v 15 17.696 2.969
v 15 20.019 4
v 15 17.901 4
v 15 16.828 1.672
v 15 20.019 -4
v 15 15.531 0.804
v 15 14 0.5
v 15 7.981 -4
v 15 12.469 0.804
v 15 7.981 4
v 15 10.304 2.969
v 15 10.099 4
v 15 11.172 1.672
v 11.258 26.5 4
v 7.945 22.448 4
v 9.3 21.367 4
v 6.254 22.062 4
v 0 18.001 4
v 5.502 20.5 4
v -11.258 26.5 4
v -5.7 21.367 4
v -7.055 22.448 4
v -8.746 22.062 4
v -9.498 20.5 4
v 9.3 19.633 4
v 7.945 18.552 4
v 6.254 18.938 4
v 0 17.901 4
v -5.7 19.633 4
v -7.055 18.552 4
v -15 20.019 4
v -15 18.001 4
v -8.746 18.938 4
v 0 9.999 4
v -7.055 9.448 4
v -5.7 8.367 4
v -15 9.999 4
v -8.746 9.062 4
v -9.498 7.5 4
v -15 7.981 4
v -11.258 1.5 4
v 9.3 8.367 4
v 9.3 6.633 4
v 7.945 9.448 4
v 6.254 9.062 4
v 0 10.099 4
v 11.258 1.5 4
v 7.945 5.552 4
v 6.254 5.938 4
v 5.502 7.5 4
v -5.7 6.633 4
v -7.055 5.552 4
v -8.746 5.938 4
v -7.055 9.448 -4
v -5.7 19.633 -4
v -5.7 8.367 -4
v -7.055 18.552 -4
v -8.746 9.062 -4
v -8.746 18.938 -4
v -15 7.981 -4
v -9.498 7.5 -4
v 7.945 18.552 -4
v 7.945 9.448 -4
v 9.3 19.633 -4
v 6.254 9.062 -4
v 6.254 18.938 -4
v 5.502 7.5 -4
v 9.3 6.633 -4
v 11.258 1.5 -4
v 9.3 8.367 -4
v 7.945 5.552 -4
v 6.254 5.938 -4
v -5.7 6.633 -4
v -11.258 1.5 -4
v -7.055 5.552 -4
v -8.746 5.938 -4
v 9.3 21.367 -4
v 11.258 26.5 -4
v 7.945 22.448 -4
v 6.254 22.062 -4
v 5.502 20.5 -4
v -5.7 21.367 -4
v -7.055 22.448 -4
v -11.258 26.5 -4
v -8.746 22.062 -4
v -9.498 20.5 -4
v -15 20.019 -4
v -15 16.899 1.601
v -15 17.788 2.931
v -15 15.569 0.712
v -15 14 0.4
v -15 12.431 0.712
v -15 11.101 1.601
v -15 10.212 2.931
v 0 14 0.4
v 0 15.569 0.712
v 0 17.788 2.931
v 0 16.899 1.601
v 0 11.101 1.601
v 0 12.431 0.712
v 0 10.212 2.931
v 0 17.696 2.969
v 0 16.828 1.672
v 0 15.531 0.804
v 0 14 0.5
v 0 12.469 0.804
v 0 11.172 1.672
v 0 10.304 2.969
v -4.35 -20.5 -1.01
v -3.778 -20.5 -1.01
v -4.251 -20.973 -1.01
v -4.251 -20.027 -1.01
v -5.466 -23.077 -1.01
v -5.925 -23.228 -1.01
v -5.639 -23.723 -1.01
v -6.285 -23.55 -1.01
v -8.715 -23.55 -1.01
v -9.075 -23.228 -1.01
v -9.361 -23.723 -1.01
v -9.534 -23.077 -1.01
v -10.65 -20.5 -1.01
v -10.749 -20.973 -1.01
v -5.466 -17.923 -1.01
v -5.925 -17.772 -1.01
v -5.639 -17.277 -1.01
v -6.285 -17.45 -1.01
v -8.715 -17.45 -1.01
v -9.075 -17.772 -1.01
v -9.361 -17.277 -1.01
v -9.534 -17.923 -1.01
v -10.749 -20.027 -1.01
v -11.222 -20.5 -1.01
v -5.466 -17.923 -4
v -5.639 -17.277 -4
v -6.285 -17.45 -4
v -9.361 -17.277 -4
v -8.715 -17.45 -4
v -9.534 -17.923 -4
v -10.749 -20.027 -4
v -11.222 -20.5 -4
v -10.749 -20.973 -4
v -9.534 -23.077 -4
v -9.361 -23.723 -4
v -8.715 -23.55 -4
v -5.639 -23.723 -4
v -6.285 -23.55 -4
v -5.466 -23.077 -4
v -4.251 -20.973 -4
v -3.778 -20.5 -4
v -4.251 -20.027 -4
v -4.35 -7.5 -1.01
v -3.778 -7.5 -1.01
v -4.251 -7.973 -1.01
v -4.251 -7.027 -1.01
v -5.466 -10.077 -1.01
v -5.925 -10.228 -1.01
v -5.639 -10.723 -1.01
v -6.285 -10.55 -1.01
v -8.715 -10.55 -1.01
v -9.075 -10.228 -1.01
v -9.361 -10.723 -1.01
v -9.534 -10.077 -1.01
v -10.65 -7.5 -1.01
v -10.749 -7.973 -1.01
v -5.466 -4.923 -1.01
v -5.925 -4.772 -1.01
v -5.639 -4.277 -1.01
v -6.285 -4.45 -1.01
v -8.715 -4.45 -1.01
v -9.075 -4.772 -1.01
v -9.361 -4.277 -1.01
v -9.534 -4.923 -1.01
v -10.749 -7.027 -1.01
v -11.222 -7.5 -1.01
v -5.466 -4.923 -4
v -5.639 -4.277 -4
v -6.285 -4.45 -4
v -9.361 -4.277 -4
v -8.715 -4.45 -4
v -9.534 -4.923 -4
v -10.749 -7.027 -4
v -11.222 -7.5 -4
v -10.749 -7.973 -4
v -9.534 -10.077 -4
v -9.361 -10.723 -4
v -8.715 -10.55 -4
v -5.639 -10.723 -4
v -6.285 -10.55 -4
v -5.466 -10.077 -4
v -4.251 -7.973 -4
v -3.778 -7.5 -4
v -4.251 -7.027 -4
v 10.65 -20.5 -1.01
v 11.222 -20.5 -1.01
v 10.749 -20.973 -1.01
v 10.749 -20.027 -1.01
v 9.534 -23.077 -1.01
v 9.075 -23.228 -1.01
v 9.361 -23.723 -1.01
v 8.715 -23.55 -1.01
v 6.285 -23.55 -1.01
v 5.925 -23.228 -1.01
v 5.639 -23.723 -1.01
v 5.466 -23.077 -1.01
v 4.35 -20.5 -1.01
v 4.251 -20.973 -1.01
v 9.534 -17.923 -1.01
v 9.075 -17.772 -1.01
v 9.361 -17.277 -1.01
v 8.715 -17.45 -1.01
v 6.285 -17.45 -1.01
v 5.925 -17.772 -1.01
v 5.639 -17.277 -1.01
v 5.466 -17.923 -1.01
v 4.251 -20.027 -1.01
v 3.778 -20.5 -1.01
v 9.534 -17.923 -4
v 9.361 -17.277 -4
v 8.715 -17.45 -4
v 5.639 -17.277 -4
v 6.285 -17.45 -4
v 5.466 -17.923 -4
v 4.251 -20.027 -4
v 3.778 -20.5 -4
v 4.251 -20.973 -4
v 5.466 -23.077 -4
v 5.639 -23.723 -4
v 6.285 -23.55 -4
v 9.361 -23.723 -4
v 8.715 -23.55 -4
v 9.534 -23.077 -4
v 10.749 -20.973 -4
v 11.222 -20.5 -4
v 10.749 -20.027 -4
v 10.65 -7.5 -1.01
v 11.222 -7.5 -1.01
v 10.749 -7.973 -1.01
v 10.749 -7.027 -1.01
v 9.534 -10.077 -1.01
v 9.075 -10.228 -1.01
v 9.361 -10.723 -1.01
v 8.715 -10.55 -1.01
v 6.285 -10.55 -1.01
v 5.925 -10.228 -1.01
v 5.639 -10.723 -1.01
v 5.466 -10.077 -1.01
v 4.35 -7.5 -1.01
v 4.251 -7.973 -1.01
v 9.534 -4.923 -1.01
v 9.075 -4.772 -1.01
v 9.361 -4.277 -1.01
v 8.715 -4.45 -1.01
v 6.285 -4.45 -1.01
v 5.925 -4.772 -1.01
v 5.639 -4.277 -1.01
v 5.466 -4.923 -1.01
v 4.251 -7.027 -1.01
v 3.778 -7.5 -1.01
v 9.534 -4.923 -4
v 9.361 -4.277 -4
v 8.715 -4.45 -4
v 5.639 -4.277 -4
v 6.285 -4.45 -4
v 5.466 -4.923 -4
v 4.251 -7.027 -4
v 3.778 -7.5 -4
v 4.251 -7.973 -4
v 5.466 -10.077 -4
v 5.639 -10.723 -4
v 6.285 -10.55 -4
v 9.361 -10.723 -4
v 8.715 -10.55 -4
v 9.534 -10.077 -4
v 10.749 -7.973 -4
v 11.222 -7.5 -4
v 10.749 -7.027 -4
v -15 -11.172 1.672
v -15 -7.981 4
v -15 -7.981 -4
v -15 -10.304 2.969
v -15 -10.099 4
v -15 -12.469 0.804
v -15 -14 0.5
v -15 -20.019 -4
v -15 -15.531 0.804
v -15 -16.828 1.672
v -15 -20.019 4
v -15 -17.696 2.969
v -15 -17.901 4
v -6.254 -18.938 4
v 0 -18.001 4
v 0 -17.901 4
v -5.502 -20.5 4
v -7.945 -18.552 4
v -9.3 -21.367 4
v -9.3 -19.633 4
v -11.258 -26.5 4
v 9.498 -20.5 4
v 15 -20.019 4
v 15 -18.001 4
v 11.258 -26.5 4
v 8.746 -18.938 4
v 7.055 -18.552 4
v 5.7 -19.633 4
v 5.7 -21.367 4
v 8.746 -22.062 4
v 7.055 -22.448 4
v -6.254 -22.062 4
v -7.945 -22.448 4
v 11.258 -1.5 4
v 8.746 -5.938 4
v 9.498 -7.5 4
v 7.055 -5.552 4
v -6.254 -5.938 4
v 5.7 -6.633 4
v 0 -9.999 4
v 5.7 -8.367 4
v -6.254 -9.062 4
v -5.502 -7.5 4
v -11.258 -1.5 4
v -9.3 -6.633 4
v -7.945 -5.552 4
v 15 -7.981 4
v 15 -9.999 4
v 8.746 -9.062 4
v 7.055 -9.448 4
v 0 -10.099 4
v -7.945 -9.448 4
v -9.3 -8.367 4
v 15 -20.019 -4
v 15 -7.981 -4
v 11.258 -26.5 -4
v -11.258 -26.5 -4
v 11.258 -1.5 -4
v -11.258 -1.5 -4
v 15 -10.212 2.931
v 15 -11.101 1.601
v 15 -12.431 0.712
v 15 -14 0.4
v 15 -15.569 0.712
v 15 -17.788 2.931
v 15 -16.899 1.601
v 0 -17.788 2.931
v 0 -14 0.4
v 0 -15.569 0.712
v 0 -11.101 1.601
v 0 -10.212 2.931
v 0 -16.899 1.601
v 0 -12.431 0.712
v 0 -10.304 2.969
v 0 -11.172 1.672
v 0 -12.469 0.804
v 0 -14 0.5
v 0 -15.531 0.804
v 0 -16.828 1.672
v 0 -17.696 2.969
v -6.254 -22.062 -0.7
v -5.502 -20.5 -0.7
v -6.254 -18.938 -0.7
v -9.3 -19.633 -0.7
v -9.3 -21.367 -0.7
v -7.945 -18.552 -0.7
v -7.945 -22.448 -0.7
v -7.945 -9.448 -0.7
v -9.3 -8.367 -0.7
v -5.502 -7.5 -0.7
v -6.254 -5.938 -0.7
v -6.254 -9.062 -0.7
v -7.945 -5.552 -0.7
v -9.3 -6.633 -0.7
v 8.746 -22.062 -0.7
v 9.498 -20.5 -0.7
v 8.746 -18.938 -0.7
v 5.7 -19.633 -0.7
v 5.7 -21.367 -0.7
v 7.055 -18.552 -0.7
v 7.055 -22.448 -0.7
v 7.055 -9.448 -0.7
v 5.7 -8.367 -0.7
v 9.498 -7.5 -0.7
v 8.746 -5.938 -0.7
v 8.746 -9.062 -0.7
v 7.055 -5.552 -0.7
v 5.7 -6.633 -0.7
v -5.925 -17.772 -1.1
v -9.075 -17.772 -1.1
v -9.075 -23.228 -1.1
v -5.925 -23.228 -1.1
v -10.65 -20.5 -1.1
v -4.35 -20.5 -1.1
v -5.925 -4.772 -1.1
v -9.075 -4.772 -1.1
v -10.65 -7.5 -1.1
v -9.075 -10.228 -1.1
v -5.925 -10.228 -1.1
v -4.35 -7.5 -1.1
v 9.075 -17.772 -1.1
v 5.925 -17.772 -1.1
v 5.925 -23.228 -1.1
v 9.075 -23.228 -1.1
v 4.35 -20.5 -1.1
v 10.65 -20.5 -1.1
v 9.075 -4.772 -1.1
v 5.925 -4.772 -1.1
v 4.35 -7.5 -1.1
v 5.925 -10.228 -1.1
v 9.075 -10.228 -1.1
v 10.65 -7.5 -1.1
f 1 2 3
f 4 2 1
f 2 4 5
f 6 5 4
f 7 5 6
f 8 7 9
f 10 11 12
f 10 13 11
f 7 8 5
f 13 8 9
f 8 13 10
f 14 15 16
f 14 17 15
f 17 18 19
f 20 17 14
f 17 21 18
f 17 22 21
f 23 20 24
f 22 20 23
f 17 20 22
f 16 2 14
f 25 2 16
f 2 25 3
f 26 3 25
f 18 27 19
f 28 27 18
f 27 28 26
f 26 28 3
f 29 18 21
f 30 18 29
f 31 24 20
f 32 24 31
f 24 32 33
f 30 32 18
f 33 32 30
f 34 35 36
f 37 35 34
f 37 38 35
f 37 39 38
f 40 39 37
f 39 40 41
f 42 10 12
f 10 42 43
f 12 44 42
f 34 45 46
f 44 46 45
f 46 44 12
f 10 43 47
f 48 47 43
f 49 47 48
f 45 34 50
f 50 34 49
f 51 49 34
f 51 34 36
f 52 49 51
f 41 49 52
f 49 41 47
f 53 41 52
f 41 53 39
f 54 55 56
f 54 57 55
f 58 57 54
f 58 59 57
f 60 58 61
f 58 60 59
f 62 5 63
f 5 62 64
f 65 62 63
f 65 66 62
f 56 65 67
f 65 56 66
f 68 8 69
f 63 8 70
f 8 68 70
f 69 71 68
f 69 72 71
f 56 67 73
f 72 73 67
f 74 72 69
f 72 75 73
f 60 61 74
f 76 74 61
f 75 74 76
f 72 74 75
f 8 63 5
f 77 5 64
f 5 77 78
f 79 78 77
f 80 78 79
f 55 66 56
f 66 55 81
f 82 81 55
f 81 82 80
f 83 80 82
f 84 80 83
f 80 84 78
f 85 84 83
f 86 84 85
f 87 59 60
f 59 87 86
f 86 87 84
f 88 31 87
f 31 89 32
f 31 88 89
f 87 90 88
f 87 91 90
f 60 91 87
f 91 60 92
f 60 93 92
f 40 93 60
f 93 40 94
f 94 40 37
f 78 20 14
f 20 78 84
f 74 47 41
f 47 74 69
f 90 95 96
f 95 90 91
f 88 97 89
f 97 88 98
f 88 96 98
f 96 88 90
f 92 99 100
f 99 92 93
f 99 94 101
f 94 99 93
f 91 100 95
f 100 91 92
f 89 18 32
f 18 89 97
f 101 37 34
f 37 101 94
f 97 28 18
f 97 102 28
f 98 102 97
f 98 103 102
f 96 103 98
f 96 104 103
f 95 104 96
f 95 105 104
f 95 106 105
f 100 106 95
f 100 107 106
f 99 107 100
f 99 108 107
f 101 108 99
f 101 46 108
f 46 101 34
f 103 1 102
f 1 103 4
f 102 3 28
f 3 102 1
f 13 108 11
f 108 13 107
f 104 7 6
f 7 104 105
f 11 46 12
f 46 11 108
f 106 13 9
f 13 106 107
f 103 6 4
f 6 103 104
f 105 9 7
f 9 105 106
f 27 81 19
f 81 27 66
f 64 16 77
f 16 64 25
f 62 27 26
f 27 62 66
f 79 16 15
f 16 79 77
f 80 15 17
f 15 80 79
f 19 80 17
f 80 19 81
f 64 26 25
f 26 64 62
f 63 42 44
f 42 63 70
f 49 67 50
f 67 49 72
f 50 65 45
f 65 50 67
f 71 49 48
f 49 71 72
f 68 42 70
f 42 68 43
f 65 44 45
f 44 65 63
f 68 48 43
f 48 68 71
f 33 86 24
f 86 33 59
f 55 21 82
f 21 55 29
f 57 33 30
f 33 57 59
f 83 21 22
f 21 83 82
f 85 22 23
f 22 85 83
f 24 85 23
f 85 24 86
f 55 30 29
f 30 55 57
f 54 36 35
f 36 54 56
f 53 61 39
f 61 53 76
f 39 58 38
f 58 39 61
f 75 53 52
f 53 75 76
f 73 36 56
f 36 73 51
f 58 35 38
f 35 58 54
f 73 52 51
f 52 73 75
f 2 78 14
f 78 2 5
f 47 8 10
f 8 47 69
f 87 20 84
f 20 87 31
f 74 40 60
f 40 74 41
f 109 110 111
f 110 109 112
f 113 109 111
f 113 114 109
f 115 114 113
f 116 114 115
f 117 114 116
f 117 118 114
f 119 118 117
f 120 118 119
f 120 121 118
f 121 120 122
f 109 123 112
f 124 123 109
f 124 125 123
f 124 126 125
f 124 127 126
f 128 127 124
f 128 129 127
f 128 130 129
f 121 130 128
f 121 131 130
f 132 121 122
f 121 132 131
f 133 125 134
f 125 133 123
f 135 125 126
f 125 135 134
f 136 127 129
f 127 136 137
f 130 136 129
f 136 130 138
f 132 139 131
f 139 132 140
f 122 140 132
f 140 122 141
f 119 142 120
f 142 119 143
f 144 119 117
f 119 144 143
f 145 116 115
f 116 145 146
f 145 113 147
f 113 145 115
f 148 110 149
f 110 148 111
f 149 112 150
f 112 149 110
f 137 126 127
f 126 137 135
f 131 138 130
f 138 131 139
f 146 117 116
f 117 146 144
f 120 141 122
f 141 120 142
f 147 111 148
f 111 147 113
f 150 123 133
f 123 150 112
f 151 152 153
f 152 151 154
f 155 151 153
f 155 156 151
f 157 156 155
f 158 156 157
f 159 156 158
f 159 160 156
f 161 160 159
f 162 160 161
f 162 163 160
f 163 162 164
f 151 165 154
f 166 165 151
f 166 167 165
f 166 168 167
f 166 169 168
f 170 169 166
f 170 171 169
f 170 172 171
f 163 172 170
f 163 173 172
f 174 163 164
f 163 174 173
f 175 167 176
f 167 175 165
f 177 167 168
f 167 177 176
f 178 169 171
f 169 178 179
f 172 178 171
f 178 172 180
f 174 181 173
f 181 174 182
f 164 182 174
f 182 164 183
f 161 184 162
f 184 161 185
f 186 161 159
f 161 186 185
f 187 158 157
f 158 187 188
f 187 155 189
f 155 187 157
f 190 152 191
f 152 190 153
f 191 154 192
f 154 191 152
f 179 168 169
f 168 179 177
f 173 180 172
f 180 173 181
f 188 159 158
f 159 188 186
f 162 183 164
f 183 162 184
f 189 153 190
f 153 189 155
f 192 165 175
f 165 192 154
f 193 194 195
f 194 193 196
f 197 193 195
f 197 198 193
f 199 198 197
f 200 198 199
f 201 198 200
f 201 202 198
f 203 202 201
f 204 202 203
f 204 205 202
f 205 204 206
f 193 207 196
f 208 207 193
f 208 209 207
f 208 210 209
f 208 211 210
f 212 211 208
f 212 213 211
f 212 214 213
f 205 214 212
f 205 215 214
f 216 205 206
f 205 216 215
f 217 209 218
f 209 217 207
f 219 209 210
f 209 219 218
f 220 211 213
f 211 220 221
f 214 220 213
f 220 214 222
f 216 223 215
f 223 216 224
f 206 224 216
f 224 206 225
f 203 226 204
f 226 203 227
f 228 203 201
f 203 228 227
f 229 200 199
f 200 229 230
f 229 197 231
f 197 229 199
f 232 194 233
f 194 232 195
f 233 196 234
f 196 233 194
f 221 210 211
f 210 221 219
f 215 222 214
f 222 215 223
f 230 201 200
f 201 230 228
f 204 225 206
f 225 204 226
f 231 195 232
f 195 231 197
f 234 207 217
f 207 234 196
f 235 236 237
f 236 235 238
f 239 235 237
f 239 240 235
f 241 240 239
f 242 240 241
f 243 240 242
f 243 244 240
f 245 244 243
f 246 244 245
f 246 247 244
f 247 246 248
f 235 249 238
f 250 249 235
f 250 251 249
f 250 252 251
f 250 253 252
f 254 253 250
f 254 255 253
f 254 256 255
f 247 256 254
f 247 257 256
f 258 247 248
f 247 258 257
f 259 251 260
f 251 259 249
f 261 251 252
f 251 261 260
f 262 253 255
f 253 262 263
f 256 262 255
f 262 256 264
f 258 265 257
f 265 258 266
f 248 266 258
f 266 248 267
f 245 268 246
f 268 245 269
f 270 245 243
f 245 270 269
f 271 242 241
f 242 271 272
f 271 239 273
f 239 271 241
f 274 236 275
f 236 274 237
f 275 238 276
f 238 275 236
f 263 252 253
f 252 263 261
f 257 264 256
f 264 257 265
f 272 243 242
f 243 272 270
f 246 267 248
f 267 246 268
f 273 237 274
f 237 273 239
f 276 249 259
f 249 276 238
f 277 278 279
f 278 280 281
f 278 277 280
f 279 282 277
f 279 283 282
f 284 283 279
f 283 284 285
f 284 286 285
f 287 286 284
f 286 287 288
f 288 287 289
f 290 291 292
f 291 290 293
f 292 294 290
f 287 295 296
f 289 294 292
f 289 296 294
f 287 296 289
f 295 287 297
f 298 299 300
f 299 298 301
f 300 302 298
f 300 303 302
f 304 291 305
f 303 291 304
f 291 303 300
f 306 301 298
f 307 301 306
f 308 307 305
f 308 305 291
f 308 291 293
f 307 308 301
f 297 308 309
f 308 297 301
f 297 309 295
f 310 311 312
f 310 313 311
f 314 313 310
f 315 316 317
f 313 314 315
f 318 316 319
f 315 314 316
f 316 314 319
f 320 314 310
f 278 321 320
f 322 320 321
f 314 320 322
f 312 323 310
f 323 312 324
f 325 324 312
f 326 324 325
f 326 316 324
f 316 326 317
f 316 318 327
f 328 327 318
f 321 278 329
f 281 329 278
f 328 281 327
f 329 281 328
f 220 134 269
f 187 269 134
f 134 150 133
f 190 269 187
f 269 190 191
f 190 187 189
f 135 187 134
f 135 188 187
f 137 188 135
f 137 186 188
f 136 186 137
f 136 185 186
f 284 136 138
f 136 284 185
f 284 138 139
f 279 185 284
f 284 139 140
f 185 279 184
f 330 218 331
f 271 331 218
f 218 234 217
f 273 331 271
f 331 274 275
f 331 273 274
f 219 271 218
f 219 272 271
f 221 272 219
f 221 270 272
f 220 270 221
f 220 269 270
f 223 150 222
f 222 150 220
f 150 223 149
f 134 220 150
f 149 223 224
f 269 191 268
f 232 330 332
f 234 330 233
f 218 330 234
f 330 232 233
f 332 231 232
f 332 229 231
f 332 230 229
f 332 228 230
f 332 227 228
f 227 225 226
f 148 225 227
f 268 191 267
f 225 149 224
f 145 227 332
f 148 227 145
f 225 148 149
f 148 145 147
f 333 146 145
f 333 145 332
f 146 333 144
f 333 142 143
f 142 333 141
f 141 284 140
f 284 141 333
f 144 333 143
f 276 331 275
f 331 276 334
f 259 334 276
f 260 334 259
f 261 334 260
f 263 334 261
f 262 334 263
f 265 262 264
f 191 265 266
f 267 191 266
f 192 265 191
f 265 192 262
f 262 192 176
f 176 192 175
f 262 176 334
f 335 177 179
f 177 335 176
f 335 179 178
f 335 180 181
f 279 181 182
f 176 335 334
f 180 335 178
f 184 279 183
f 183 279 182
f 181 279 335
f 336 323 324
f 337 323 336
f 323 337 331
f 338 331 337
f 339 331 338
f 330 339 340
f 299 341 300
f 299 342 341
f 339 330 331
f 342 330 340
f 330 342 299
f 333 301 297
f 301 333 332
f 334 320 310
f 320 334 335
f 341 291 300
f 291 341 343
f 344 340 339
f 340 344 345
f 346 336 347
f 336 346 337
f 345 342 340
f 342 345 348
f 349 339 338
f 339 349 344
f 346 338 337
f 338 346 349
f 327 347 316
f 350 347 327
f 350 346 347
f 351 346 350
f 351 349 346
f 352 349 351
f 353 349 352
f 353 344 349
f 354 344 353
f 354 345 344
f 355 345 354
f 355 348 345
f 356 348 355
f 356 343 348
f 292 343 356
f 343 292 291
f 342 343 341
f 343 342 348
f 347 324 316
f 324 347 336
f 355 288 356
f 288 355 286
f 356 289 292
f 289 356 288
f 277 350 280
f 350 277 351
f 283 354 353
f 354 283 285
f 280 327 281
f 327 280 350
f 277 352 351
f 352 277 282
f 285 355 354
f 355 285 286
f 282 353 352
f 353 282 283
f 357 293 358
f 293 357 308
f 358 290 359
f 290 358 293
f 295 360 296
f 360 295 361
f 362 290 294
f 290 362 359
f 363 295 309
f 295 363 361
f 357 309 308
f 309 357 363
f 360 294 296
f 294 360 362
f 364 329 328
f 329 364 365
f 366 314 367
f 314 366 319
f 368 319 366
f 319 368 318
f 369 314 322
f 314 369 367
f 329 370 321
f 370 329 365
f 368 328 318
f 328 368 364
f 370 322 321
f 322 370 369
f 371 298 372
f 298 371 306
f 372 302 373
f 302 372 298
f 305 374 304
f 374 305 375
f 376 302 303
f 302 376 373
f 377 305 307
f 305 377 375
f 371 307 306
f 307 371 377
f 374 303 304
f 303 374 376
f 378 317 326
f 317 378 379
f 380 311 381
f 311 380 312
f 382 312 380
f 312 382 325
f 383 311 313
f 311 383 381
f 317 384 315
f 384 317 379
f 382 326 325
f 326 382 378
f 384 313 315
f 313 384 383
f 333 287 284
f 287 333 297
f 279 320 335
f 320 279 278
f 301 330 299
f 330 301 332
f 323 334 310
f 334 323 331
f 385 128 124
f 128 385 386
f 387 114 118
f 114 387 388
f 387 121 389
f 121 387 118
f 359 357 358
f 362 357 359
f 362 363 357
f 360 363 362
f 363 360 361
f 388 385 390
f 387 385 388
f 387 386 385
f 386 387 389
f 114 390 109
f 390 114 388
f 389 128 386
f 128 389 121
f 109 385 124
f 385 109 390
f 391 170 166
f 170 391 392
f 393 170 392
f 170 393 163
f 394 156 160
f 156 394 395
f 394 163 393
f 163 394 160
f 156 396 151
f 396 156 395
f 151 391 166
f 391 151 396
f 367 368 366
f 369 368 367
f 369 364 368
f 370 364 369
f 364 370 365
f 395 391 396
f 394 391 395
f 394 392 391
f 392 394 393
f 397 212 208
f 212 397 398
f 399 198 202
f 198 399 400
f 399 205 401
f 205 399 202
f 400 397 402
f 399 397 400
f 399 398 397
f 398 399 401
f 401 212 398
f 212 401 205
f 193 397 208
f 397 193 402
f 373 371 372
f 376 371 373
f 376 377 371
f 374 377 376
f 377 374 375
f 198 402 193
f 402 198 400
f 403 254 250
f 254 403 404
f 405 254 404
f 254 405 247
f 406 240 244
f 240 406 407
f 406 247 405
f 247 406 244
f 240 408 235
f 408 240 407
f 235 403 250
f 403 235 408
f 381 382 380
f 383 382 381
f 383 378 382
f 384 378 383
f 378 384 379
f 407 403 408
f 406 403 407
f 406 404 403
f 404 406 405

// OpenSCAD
// file: functions.scad
// PRUSA Mendel  
// Functions used in many files
// GNU GPL v2
// Josef Průša
// josefprusa@me.com
// prusadjs.cz
// http://www.reprap.org/wiki/Prusa_Mendel
// http://github.com/prusajr/PrusaMendel

module nut( d, h, horizontal = true )
{
	cornerdiameter = ( d / 2 ) / cos( 180 / 6 );
	cylinder( h = h, r = cornerdiameter, $fn = 6 );
	if( horizontal )
	{
		for( i = [1 : 6] )
		{
			rotate( [0, 0, 60 * i] ) translate( [-cornerdiameter - 0.2, 0, 0] ) rotate( [0, 0, -45] ) cube( size = [2, 2, h] );
		}
	}
}

// By nophead
module polyhole( d, h ) 
{
	n = max( round( 2 * d ), 3 );
	rotate( [0, 0, 180] ) cylinder( h = h, r = ( d / 2 ) / cos( 180 / n ), $fn = n );
}

module roundcorner( diameter )
{
	difference()
	{
		cube( size = [diameter, diameter, 99], center = false );
		translate( v = [diameter, diameter, 0] ) cylinder( h = 100, r = diameter, center = true );
	}
}
// file: metric.scad
// PRUSA Mendel  
// Default metric sizes
// GNU GPL v2
// Josef Průša
// josefprusa@me.com
// prusadjs.cz
// http://www.reprap.org/wiki/Prusa_Mendel
// http://github.com/prusajr/PrusaMendel

// DONT CHANGE THIS FILE! ALTER VALUES IN CONFIGURATION.SCAD INSTEAD

// RODS

threaded_rod_diameter = 8.2;
threaded_rod_diameter_horizontal = 8.2;
smooth_bar_diameter = 8;
smooth_bar_diameter_horizontal = 8.5;

// Nuts and bolts

m8_diameter = 9;
m8_nut_diameter = 16.4;

m4_diameter = 4.5;
m4_nut_diameter = 9;

m3_diameter = 3.6;
m3_nut_diameter = 6.1;

// Bushing holder

bushing_core_diameter = smooth_bar_diameter;
bushing_material_thickness = 1;

// Motors

motor_shaft = 5.5;
// file: configuration.scad
// PRUSA Mendel  
// Configuration file
// GNU GPL v2
// Josef Průša
// josefprusa@me.com
// prusadjs.cz
// http://www.reprap.org/wiki/Prusa_Mendel
// http://github.com/prusajr/PrusaMendel

// PLEASE SELECT ONE OF THE CONFIGURATIONS BELOW
// BY UN-COMMENTING IT

// Uncomment for metric settings
// METRIC METRIC METRIC METRIC METRIC METRIC METRIC METRIC 

include <metric.scad>;

// Uncomment for imperial settings
// IMPERIAL IMPERIAL IMPERIAL IMPERIAL IMPERIAL IMPERIAL IMPERIAL 

//include <sae.scad>;

// CUSTOM CUSTOM CUSTOM CUSTOM CUSTOM CUSTOM CUSTOM CUSTOM CUSTOM

// Thin walls
layer_height = 0.3;
wot = 1.5;
filament_width = layer_height * wot;

thin_wall = 4 * layer_height * wot;

// LM8UU
linear = true;
linear_bearing_diameter = 15;
linear_bearing_length = 24;

//608 bearing
bearing_diameter = 22;
bearing_thickness = 7;

//Timing belt
belt_pitch = 5;

// CHANGE ONLY THE STUFF YOU KNOW
// IT WILL REPLACE DEFAULT SETTING

// RODS

// threaded_rod_diameter = 0;
// threaded_rod_diameter_horizontal = 0;
// smooth_bar_díameter = 0;
// smooth_bar_díameter_horizontal = 0;

// Nuts and bolts

// m8_diameter = 0;
// m8_nut_diameter = 0;
// m8_nut_thickness = 0;

// m4_diameter = 0;
 m4_nut_diameter = 8.5;
// m4_nut_thickness = 0;

// m3_diameter = 0;
// m3_nut_diameter = 0;
m3_nut_thickness = 3;

// Bushing holder

// bushing_core_diameter = smooth_bar_díameter;
// bushing_material_thickness = 0;

///counted stuff
m3_nut_diameter_bigger = ( ( m3_nut_diameter  / 2) / cos( 180 / 6 ) ) * 2;

// functions 
include <functions.scad>
// main file
// PRUSA Mendel  
// Coupling
// Used for joining Z leadscrew to motor shaft
// GNU GPL v2
// Josef Průša
// josefprusa@me.com
// prusadjs.cz
// http://www.reprap.org/wiki/Prusa_Mendel
// http://github.com/prusajr/PrusaMendel

include <configuration.scad>

/**
 * @id coupling
 * @name Coupling
 * @category Printed
 * @using 4 m3x20
 * @using 4 m3washer
 * @using 4 m3nut
 * @step Place M3 nuts in all nut traps.
 * @step Insert screws with washers on them and tighet it just a bit.
 */

/**
 * 20mm long piece of PVC tube. 5mm inside diameter, 8mm outside diameter.
 * @id coupling-tube
 * @name Coupling tube
 * @category Nuts&bolts
 */

translate( [0, 14, 0] ) coupling( c = 0 );
translate( [0, -14, 0] ) rotate( [0, 0, 180] ) coupling( c = 1 );

holeX = 7.5;
holeY = 6.5;

corner_cut = 26;

shaft_dia = 8.0;

module coupling(c)
{
	union()
	{
		difference()
		{
			cube( size = [30, 25, 8], center = true );

			if( c == 1 )
			{
				//slot
				*cube(size = [2, 40, 30], center = true);
                
				//nut holes
				translate( [holeX,  holeY, m3_nut_thickness / 2 - 4.01 - 3 / 2] ) nut( m3_nut_diameter, m3_nut_thickness );
				translate( [holeX, -holeY, m3_nut_thickness / 2 - 4.01 - 3 / 2] ) nut( m3_nut_diameter, m3_nut_thickness );
				translate( [-holeX,  holeY, m3_nut_thickness / 2 - 4.01 - 3 / 2] ) nut( m3_nut_diameter, m3_nut_thickness );
				translate( [-holeX, -holeY, m3_nut_thickness / 2 - 4.01 - 3 / 2] ) nut( m3_nut_diameter, m3_nut_thickness );
			}

			//shaft groves
			translate( [-16, 0, 4.5] ) rotate( [0, 90, 0] ) cylinder( h = 16, r = threaded_rod_diameter / 2, $fn = 16 );
			translate( [-0.5, 0, 4.5] ) rotate( [0, 90, 0] ) cylinder( h = 16, r = shaft_dia / 2,  $fn = 16 );

			//screw holes
			translate( [holeX,  holeY, -10] ) polyhole( m3_diameter, 20 );
			translate( [holeX, -holeY, -10] ) polyhole( m3_diameter, 20 );
			translate( [-holeX,  holeY, -10] ) polyhole( m3_diameter, 20 );
			translate( [-holeX, -holeY, -10] ) polyhole( m3_diameter, 20 );

			//corners
			rotate( [0, 0, 30] ) translate( [corner_cut, 0, 0] ) cube( size = [20, 40, 20], center = true );
			rotate( [0, 0, -30] ) translate( [corner_cut, 0, 0] ) cube( size = [20, 40, 20], center = true );
			rotate( [0, 0, 150] )  translate( [corner_cut, 0, 0] ) cube( size = [20, 40, 20], center = true );
			rotate( [0, 0, -150] ) translate( [corner_cut, 0, 0] ) cube( size = [20,40,20], center = true );
		}

		if( c == 1 )
		{
			 // bridge
			translate( [holeX, holeY, m3_nut_thickness - 3.9] ) cylinder( h = 0.4, r = m3_nut_diameter / 2 + 0.1, $fn = 6, center = true );
			translate( [holeX, -holeY, m3_nut_thickness - 3.9] ) cylinder( h = 0.4, r = m3_nut_diameter / 2 + 0.1, $fn = 6, center = true );
			translate( [-holeX,  holeY, m3_nut_thickness - 3.9] ) cylinder( h = 0.4, r = m3_nut_diameter / 2 + 0.1, $fn =6, center = true );
			translate( [-holeX, -holeY, m3_nut_thickness - 3.9] ) cylinder( h = 0.4, r = m3_nut_diameter / 2 + 0.1, $fn =6, center = true );
		}
	}
}
